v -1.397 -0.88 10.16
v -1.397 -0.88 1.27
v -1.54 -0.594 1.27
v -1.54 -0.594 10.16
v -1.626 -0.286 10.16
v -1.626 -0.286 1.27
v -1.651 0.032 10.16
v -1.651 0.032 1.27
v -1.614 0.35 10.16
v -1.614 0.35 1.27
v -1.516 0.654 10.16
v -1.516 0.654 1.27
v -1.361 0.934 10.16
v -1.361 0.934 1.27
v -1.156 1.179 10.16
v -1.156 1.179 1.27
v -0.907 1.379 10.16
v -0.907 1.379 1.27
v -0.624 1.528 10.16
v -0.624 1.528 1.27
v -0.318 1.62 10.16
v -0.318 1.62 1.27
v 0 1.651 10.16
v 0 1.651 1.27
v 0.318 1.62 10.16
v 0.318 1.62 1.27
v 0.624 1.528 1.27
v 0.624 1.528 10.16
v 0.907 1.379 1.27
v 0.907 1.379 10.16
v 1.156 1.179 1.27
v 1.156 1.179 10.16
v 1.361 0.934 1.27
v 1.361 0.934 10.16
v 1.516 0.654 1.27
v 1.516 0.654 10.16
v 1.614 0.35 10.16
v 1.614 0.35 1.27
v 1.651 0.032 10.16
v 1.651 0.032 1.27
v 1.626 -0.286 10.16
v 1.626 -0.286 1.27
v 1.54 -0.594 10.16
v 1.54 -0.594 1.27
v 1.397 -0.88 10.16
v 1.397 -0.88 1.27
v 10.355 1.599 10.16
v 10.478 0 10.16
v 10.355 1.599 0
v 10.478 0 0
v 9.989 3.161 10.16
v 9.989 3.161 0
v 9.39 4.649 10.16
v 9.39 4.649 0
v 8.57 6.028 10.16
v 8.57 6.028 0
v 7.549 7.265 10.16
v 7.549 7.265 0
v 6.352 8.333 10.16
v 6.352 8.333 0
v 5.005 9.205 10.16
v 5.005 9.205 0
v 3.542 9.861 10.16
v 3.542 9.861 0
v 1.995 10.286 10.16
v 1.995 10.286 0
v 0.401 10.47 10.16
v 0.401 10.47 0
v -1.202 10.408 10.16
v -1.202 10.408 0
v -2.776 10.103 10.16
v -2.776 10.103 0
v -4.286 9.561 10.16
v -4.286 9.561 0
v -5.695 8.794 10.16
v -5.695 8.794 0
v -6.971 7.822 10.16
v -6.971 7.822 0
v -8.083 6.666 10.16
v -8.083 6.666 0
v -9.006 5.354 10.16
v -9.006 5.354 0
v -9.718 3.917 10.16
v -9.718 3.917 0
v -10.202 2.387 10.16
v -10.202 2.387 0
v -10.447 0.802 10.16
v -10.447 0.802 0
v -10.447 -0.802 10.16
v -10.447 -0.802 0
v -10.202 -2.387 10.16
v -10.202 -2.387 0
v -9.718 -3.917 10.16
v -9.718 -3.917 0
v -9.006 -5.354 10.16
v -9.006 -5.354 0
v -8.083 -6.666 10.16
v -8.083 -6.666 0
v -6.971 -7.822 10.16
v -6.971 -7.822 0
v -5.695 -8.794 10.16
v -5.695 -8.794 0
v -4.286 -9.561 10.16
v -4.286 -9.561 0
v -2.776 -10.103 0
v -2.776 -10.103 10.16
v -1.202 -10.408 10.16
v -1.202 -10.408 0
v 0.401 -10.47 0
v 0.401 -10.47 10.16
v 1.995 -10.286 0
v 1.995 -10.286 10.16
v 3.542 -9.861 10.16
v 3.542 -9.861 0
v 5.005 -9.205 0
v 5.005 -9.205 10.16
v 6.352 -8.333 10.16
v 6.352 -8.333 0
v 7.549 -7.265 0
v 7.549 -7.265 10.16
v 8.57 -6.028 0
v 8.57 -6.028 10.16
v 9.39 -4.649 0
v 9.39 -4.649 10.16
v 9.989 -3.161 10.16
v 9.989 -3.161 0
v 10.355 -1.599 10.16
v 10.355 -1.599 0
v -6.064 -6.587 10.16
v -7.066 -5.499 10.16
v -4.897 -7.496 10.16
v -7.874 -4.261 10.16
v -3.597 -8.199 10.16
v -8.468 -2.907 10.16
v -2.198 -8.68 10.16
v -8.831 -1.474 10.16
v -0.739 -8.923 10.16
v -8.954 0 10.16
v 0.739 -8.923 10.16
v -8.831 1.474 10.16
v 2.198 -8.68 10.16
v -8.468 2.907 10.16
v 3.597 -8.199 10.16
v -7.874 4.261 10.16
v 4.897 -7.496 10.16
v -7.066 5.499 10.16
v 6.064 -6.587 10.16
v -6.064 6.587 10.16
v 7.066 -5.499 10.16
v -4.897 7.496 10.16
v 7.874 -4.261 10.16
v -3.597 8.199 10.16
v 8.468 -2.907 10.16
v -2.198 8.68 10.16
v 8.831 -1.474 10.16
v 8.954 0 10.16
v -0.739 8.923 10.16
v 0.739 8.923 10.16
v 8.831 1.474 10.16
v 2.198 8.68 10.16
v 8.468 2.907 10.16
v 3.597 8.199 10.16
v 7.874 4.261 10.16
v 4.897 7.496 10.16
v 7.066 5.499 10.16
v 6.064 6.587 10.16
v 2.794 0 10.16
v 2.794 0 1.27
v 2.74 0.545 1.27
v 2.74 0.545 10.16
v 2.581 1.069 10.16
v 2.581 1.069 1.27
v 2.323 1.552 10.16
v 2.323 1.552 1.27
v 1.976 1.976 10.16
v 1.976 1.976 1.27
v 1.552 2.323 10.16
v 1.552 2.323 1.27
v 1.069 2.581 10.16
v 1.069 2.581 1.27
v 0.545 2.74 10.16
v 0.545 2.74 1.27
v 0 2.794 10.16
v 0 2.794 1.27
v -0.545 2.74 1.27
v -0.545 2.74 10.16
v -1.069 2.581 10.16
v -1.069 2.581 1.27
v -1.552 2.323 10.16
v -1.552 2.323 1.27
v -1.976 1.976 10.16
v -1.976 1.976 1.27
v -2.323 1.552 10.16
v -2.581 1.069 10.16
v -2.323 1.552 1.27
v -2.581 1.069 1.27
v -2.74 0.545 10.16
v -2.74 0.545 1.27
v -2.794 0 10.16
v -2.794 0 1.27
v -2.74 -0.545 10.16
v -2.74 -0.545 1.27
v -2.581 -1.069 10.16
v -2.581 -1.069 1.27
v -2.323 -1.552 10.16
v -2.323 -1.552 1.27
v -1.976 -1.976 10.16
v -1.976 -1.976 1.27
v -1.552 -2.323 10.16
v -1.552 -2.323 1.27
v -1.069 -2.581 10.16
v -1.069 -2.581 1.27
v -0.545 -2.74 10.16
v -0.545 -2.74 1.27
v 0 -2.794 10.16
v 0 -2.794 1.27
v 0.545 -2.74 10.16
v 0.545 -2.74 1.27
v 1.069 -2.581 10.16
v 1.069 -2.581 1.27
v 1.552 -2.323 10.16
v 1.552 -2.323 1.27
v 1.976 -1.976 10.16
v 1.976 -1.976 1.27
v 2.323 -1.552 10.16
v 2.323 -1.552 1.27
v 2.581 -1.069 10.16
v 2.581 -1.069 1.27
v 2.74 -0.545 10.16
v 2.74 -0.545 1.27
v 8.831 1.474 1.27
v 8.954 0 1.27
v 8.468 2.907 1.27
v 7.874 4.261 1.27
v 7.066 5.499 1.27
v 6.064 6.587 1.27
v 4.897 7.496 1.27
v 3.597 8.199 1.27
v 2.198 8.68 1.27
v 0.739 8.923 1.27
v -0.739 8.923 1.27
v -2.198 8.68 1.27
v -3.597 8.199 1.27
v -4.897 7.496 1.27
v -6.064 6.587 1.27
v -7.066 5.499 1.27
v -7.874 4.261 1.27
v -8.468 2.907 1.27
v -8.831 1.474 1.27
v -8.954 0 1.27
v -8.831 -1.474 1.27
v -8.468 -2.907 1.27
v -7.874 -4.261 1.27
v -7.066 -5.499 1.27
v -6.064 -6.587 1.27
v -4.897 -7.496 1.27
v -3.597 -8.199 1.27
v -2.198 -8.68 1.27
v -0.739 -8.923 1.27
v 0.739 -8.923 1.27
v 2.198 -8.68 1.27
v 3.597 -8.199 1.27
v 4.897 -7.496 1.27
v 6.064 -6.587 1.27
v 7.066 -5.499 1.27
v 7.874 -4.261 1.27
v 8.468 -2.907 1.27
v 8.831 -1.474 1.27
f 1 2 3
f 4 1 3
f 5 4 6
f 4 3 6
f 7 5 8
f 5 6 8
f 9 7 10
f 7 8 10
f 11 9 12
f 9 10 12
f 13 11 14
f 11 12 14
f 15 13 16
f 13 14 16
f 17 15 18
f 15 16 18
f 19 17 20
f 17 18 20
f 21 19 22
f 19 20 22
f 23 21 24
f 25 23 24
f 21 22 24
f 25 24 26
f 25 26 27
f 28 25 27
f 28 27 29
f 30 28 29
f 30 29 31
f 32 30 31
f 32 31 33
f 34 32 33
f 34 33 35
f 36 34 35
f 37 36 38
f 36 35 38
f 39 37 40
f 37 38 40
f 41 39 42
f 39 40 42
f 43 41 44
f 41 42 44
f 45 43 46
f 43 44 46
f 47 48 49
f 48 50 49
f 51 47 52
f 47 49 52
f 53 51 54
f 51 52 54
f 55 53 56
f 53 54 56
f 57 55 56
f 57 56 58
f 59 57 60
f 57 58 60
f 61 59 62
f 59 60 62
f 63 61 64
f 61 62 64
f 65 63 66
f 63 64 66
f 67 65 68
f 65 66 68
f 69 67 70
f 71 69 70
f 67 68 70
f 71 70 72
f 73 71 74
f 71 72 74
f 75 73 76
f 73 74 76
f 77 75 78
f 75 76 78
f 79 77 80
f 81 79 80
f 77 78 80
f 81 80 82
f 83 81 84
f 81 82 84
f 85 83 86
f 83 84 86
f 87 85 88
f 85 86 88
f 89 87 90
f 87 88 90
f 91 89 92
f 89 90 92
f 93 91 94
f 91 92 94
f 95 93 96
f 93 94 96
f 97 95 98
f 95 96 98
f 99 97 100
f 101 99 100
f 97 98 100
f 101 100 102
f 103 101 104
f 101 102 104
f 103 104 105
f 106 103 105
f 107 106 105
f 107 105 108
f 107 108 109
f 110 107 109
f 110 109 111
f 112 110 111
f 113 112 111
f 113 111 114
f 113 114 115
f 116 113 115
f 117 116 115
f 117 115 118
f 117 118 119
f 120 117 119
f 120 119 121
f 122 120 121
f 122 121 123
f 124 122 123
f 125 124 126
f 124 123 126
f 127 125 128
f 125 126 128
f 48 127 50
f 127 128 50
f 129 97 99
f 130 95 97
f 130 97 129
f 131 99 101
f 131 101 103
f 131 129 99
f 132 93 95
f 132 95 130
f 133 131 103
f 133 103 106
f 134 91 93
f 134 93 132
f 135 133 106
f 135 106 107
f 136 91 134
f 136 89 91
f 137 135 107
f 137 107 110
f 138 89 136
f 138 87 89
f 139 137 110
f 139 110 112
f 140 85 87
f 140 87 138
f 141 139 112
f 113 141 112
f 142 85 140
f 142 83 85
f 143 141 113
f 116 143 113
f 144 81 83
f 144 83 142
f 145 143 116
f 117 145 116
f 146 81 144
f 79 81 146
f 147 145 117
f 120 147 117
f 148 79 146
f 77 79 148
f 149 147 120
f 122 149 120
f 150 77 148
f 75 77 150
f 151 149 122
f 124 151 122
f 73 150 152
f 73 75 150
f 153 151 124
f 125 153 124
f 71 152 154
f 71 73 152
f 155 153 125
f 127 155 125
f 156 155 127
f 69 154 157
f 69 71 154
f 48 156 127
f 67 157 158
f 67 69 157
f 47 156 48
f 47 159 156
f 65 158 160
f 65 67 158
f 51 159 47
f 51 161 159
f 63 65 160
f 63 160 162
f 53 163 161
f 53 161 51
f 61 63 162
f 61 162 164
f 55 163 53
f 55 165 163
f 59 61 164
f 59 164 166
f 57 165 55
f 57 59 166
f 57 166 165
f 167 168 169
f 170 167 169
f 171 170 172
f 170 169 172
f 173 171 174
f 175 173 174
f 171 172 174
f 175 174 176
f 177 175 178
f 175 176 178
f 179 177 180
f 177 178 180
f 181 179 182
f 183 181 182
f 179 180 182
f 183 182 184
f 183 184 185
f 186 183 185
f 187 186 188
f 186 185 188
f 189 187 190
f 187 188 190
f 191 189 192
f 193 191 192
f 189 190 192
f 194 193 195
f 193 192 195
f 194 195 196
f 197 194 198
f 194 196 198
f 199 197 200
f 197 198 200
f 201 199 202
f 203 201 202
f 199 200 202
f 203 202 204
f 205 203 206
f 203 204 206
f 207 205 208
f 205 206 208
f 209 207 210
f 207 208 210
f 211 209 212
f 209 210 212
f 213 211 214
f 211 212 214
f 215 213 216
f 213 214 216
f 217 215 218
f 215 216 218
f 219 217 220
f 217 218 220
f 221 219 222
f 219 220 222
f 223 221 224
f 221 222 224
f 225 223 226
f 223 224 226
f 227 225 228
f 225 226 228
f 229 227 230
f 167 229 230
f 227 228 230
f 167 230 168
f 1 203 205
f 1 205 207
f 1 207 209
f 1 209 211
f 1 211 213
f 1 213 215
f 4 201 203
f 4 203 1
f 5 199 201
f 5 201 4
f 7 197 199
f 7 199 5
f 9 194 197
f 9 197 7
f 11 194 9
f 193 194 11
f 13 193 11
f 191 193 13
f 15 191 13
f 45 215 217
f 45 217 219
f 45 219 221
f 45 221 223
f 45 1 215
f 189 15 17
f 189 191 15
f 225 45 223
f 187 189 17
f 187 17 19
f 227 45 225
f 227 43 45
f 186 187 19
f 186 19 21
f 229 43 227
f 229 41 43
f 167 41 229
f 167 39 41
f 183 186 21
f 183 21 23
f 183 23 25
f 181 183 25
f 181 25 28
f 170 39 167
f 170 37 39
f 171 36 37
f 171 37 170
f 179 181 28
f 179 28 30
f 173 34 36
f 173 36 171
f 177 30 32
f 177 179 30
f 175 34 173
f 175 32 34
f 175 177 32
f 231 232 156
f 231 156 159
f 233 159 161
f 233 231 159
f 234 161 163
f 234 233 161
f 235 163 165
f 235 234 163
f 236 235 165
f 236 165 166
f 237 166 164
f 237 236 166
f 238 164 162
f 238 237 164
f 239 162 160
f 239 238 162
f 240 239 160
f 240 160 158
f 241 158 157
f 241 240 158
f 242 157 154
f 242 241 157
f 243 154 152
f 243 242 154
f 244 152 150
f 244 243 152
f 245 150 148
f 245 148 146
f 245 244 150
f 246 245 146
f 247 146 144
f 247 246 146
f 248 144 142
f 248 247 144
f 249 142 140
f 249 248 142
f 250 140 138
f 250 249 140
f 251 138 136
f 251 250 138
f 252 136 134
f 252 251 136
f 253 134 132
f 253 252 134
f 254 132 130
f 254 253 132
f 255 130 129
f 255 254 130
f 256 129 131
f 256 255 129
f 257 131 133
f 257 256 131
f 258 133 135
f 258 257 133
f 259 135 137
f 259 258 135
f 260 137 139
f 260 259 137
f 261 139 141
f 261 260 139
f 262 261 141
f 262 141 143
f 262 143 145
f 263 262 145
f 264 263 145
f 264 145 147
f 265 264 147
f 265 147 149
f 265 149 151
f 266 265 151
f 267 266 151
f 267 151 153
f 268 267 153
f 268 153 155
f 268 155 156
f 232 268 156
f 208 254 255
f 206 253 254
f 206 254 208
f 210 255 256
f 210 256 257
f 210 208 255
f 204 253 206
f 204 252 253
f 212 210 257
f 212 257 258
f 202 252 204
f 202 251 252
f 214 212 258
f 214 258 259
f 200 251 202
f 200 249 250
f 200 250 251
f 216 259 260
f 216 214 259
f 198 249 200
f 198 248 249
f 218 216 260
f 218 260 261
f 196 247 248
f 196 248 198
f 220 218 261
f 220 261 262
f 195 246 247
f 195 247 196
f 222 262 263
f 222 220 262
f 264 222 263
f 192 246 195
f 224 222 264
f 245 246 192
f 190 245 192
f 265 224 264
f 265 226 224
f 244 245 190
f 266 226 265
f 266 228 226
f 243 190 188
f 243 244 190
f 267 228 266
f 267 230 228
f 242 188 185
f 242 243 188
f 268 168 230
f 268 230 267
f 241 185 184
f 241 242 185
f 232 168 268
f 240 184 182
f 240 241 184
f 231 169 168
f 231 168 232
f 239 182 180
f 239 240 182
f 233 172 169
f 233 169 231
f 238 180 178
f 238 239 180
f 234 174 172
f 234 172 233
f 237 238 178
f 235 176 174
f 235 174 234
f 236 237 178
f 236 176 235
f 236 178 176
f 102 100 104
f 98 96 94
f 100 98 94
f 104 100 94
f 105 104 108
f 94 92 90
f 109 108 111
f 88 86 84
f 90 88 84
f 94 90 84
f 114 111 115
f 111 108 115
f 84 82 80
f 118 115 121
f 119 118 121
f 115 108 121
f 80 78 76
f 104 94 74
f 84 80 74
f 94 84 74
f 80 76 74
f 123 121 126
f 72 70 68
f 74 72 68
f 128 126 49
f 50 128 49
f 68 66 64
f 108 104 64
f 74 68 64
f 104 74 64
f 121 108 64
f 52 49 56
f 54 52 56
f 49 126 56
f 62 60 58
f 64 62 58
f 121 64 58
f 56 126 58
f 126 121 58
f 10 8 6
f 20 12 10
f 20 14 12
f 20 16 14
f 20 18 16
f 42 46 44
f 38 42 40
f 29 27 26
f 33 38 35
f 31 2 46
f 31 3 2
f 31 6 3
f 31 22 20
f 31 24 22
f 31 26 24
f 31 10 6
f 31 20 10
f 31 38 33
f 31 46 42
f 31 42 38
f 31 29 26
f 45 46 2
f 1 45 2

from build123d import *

# Parameters (mm, degrees)
F0_R     = 10.4775
F1_DEPTH = 1.27
F2_R     = 10.4775
F2_R_2   = 8.9535
F2_R_3   = 2.794
F3_DEPTH = 8.89


# Not quite as in the source:
# - the program builds the solid bodies; features that only make, move or delete a surface that nothing else refers to are left out


with BuildPart() as f1:
    # F0 (on Top) → F1 (new body)
    with BuildSketch(Plane.XY):
        Circle(F0_R)
    extrude(amount=F1_DEPTH)

    # F2 (on face) → F3 (join)
    with BuildSketch(Plane.XY.offset(1.27)):
        Circle(F2_R)
        Circle(F2_R_2, mode=Mode.SUBTRACT)
        Circle(F2_R_3)
        with BuildLine():
            ThreePointArc((-1.397, -0.8798818102), (0, 1.651), (1.397, -0.8798818102))
            Line((1.397, -0.8798818102), (-1.397, -0.8798818102))
        make_face(mode=Mode.SUBTRACT)
    extrude(amount=F3_DEPTH)


solid = f1.part
